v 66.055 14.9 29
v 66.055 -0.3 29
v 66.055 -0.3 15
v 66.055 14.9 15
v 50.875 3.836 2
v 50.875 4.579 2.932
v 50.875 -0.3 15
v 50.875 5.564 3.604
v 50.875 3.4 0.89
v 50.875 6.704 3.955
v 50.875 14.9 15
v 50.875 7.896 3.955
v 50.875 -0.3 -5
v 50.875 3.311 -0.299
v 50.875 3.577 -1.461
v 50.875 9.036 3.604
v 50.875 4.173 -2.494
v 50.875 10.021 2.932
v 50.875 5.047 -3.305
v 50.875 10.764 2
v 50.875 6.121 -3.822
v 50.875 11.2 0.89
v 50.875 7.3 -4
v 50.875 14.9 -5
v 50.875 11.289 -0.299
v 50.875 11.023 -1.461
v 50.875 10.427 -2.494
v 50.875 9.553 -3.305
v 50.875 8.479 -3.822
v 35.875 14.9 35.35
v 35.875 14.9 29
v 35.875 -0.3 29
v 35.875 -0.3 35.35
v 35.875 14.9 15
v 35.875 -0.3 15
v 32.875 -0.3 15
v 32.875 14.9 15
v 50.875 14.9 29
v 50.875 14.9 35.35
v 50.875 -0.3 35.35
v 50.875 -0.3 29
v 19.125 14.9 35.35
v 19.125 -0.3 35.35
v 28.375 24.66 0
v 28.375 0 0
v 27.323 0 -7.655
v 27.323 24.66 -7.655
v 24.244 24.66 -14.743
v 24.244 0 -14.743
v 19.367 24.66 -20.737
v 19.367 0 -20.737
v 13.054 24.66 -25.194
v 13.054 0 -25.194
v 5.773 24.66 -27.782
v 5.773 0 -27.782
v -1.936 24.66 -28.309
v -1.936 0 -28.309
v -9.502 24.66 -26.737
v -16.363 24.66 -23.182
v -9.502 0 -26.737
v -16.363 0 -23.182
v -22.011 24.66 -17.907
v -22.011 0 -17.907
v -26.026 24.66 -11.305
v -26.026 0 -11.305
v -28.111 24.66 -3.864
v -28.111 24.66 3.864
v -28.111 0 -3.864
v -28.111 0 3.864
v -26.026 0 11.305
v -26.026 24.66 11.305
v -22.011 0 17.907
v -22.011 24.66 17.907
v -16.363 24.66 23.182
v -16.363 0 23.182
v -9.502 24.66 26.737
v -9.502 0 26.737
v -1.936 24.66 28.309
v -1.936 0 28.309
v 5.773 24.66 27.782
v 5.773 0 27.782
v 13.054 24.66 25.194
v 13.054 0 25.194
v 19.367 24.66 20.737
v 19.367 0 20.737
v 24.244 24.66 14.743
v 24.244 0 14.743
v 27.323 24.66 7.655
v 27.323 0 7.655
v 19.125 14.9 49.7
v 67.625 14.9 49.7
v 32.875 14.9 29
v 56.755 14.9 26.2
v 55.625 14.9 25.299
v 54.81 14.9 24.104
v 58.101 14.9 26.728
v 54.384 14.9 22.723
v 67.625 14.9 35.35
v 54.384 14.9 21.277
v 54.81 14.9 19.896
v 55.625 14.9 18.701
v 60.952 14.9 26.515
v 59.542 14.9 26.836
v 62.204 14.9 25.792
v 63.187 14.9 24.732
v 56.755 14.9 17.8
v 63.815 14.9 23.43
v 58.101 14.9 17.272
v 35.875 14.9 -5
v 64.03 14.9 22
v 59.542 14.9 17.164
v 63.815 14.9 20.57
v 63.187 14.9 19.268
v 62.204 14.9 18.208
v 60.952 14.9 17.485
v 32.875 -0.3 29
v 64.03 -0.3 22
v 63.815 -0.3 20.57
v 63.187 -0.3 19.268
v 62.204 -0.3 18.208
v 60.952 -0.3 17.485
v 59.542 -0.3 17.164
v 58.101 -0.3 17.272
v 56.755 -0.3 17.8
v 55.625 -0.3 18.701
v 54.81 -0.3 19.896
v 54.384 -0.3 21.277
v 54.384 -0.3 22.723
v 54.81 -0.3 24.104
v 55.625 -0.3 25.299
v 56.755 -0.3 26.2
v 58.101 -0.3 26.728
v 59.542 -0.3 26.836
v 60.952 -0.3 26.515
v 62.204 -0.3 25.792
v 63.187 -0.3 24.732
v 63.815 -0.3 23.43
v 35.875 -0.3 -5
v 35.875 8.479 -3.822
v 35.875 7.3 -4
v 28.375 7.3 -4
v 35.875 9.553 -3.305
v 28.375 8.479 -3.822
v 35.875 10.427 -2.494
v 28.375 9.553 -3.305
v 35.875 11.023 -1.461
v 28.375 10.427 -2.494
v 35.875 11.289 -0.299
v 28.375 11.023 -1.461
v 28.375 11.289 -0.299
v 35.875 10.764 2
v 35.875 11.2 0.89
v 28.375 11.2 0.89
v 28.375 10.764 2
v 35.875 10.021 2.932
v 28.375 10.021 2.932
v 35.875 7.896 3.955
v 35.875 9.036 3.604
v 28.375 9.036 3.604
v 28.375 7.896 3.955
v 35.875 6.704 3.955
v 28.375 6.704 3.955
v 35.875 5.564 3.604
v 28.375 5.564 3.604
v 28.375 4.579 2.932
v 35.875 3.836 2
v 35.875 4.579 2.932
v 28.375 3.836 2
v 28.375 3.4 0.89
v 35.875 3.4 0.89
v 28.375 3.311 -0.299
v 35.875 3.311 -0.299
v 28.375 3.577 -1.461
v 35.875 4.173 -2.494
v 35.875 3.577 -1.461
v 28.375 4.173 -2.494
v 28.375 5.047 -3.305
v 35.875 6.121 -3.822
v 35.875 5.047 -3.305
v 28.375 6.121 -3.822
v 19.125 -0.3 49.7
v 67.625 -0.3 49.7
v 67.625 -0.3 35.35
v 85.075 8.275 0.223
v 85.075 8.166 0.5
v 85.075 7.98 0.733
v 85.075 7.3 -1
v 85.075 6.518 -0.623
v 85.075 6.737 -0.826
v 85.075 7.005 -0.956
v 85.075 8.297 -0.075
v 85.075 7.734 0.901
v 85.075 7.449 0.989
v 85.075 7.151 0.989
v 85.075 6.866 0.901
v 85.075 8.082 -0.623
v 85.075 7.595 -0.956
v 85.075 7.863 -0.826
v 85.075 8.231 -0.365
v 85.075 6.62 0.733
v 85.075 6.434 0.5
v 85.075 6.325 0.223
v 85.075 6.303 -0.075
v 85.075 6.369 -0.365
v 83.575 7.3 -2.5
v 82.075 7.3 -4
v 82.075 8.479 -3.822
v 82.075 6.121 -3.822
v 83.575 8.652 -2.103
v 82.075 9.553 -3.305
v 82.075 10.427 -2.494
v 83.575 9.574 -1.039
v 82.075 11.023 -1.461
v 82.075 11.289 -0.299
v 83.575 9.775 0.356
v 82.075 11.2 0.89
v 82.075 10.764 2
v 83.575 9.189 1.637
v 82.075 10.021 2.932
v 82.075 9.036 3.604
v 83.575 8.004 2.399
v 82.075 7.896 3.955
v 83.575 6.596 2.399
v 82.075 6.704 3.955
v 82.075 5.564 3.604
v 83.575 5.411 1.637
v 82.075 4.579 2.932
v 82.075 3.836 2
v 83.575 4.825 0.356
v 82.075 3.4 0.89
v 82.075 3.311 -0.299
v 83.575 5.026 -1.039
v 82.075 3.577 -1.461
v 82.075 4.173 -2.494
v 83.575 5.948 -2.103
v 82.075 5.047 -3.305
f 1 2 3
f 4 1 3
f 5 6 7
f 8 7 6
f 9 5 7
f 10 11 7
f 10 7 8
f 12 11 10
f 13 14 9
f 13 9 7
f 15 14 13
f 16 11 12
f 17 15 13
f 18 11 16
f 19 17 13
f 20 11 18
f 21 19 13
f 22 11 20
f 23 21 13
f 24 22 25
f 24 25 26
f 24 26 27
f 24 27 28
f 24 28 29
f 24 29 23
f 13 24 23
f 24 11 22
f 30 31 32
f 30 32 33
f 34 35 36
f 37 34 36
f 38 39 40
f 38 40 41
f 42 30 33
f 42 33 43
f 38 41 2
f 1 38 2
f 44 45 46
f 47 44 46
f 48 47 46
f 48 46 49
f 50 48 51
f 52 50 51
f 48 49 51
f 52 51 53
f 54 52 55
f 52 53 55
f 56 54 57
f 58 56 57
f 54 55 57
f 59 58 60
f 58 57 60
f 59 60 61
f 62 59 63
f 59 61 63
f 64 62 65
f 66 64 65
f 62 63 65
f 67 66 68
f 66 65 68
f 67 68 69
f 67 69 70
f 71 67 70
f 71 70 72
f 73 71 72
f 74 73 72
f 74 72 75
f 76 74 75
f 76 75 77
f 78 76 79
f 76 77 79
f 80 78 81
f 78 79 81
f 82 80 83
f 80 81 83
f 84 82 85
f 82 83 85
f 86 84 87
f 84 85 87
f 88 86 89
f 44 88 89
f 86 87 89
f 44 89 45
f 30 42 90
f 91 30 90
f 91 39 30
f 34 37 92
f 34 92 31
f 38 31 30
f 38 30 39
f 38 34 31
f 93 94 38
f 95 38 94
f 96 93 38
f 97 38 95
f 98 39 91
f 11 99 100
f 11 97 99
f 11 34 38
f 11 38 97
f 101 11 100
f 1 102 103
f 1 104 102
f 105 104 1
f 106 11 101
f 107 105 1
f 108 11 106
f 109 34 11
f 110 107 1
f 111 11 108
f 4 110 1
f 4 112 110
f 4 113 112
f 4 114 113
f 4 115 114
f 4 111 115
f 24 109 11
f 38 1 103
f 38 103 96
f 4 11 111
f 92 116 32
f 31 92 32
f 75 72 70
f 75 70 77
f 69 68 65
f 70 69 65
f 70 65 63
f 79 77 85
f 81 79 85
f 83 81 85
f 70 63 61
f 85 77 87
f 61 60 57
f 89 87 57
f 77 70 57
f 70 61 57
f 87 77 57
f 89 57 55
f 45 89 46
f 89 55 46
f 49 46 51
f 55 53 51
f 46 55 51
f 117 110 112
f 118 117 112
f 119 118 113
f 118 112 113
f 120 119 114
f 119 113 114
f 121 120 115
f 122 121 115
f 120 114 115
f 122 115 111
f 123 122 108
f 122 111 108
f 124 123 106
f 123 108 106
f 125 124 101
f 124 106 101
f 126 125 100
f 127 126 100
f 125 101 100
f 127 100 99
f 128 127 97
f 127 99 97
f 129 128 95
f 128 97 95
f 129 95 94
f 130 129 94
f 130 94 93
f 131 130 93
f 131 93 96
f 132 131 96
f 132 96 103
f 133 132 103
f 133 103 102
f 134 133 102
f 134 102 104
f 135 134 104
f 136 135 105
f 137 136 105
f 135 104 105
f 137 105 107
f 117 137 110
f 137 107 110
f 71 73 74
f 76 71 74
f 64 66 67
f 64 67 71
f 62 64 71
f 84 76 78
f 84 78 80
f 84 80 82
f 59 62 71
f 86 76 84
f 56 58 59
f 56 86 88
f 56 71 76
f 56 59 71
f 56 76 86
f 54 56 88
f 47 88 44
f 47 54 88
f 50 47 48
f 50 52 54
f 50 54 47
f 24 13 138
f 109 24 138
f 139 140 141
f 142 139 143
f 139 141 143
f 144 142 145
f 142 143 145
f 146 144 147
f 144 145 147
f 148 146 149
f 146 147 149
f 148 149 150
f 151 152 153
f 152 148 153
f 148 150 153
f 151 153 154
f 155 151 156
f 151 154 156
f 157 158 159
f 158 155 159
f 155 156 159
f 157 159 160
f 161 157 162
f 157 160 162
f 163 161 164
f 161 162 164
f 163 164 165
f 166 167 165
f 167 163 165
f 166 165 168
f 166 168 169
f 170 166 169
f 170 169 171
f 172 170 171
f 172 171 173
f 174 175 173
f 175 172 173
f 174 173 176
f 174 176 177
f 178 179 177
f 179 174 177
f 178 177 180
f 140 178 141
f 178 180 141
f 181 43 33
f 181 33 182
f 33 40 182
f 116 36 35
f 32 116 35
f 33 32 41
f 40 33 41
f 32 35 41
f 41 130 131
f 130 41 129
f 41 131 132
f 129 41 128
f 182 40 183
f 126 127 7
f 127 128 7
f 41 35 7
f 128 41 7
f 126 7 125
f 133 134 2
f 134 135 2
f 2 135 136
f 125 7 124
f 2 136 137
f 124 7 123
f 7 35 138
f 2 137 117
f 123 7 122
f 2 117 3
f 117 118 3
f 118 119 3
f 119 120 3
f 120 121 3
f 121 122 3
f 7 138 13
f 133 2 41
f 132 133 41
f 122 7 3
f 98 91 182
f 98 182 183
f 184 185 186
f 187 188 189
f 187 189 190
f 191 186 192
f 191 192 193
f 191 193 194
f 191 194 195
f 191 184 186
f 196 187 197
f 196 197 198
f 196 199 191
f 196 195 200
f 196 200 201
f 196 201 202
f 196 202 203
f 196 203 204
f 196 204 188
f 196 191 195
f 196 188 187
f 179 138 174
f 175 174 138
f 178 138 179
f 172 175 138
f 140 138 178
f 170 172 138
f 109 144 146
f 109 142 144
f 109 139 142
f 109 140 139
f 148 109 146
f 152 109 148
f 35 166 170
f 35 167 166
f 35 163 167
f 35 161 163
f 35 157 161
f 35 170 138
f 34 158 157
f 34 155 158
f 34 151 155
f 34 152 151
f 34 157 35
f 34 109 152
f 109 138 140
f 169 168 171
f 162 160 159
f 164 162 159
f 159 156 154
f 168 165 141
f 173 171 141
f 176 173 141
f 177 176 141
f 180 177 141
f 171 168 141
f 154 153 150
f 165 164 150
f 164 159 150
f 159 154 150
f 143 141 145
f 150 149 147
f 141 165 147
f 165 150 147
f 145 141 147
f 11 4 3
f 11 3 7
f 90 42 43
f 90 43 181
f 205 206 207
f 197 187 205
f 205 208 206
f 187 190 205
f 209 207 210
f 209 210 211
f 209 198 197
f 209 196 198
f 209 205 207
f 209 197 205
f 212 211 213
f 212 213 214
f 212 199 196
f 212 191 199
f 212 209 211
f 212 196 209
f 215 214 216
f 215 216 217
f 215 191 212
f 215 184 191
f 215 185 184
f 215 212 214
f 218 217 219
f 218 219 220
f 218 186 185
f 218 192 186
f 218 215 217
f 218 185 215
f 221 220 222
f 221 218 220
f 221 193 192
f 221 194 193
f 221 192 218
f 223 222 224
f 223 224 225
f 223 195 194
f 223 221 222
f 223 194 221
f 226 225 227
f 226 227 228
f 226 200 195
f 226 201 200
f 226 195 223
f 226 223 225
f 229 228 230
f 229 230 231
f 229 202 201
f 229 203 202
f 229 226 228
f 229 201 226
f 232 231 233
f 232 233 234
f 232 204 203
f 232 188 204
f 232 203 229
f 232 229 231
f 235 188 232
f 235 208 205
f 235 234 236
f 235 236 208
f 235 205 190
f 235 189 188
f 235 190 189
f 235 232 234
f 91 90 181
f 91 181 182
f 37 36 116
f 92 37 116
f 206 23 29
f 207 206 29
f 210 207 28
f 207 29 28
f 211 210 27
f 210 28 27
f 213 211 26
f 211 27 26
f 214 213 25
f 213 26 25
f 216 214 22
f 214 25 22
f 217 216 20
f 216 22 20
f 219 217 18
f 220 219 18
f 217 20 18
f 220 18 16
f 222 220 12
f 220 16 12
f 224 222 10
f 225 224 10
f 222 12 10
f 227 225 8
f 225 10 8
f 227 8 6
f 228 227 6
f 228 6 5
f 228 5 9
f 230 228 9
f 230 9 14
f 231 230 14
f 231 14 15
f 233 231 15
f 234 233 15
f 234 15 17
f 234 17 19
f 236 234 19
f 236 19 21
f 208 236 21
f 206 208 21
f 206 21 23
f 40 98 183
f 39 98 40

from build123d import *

# Parameters (mm, degrees)
SKETCH1_R           = 28.375
BOSS_EXTRUDE1_DEPTH = 24.66
SKETCH3_R           = 4
BOSS_EXTRUDE2_DEPTH = 56.7
CHAMFER1_SIZE       = 3
BOSS_EXTRUDE3_DEPTH = 7.6
SKETCH6_R           = 4.85
CUT_EXTRUDE1_DEPTH  = 15.2


with BuildPart() as part:
    # Sketch1 → Boss-Extrude1 (new body)
    with BuildSketch(Plane(origin=(0, 0, 0), x_dir=(1, 0, 0), z_dir=(0, 1, 0))):
        Circle(SKETCH1_R)
    extrude(amount=BOSS_EXTRUDE1_DEPTH)


with BuildPart() as body_2:
    # Sketch3 → Boss-Extrude2 (new body)
    with BuildSketch(Plane(origin=(28.375, 0, 0), x_dir=(0, 0, -1), z_dir=(1, 0, 0))):
        with Locations((0, 7.3)):
            Circle(SKETCH3_R)
    extrude(amount=BOSS_EXTRUDE2_DEPTH)

    # Chamfer1
    chamfer1_edges = [body_2.edges().sort_by_distance(p)[0] for p in [
        (85.075, 7.3, 4),
    ]]
    chamfer(chamfer1_edges, length=CHAMFER1_SIZE)

    # Sketch5 → Boss-Extrude3 (add, symmetric)
    with BuildSketch(Plane(origin=(0, 7.3, 0), x_dir=(1, 0, 0), z_dir=(0, 1, 0))):
        Polygon((35.875, 5), (35.875, -15), (32.875, -15), (32.875, -29), (35.875, -29), (35.875, -35.35), (19.125, -35.35), (19.125, -49.7), (67.625, -49.7), (67.625, -35.35), (50.875, -35.35), (50.875, -29), (66.055, -29), (66.055, -15), (50.875, -15), (50.875, 5), align=None)
    extrude(amount=BOSS_EXTRUDE3_DEPTH, both=True)

    # Sketch6 → Cut-Extrude1 (cut)
    with BuildSketch(Plane(origin=(0, 14.9, 0), x_dir=(1, 0, 0), z_dir=(0, 1, 0))):
        with Locations((59.18, -22)):
            Circle(SKETCH6_R)
    extrude(amount=-CUT_EXTRUDE1_DEPTH, mode=Mode.SUBTRACT)


solid = Compound([part.part, body_2.part])
